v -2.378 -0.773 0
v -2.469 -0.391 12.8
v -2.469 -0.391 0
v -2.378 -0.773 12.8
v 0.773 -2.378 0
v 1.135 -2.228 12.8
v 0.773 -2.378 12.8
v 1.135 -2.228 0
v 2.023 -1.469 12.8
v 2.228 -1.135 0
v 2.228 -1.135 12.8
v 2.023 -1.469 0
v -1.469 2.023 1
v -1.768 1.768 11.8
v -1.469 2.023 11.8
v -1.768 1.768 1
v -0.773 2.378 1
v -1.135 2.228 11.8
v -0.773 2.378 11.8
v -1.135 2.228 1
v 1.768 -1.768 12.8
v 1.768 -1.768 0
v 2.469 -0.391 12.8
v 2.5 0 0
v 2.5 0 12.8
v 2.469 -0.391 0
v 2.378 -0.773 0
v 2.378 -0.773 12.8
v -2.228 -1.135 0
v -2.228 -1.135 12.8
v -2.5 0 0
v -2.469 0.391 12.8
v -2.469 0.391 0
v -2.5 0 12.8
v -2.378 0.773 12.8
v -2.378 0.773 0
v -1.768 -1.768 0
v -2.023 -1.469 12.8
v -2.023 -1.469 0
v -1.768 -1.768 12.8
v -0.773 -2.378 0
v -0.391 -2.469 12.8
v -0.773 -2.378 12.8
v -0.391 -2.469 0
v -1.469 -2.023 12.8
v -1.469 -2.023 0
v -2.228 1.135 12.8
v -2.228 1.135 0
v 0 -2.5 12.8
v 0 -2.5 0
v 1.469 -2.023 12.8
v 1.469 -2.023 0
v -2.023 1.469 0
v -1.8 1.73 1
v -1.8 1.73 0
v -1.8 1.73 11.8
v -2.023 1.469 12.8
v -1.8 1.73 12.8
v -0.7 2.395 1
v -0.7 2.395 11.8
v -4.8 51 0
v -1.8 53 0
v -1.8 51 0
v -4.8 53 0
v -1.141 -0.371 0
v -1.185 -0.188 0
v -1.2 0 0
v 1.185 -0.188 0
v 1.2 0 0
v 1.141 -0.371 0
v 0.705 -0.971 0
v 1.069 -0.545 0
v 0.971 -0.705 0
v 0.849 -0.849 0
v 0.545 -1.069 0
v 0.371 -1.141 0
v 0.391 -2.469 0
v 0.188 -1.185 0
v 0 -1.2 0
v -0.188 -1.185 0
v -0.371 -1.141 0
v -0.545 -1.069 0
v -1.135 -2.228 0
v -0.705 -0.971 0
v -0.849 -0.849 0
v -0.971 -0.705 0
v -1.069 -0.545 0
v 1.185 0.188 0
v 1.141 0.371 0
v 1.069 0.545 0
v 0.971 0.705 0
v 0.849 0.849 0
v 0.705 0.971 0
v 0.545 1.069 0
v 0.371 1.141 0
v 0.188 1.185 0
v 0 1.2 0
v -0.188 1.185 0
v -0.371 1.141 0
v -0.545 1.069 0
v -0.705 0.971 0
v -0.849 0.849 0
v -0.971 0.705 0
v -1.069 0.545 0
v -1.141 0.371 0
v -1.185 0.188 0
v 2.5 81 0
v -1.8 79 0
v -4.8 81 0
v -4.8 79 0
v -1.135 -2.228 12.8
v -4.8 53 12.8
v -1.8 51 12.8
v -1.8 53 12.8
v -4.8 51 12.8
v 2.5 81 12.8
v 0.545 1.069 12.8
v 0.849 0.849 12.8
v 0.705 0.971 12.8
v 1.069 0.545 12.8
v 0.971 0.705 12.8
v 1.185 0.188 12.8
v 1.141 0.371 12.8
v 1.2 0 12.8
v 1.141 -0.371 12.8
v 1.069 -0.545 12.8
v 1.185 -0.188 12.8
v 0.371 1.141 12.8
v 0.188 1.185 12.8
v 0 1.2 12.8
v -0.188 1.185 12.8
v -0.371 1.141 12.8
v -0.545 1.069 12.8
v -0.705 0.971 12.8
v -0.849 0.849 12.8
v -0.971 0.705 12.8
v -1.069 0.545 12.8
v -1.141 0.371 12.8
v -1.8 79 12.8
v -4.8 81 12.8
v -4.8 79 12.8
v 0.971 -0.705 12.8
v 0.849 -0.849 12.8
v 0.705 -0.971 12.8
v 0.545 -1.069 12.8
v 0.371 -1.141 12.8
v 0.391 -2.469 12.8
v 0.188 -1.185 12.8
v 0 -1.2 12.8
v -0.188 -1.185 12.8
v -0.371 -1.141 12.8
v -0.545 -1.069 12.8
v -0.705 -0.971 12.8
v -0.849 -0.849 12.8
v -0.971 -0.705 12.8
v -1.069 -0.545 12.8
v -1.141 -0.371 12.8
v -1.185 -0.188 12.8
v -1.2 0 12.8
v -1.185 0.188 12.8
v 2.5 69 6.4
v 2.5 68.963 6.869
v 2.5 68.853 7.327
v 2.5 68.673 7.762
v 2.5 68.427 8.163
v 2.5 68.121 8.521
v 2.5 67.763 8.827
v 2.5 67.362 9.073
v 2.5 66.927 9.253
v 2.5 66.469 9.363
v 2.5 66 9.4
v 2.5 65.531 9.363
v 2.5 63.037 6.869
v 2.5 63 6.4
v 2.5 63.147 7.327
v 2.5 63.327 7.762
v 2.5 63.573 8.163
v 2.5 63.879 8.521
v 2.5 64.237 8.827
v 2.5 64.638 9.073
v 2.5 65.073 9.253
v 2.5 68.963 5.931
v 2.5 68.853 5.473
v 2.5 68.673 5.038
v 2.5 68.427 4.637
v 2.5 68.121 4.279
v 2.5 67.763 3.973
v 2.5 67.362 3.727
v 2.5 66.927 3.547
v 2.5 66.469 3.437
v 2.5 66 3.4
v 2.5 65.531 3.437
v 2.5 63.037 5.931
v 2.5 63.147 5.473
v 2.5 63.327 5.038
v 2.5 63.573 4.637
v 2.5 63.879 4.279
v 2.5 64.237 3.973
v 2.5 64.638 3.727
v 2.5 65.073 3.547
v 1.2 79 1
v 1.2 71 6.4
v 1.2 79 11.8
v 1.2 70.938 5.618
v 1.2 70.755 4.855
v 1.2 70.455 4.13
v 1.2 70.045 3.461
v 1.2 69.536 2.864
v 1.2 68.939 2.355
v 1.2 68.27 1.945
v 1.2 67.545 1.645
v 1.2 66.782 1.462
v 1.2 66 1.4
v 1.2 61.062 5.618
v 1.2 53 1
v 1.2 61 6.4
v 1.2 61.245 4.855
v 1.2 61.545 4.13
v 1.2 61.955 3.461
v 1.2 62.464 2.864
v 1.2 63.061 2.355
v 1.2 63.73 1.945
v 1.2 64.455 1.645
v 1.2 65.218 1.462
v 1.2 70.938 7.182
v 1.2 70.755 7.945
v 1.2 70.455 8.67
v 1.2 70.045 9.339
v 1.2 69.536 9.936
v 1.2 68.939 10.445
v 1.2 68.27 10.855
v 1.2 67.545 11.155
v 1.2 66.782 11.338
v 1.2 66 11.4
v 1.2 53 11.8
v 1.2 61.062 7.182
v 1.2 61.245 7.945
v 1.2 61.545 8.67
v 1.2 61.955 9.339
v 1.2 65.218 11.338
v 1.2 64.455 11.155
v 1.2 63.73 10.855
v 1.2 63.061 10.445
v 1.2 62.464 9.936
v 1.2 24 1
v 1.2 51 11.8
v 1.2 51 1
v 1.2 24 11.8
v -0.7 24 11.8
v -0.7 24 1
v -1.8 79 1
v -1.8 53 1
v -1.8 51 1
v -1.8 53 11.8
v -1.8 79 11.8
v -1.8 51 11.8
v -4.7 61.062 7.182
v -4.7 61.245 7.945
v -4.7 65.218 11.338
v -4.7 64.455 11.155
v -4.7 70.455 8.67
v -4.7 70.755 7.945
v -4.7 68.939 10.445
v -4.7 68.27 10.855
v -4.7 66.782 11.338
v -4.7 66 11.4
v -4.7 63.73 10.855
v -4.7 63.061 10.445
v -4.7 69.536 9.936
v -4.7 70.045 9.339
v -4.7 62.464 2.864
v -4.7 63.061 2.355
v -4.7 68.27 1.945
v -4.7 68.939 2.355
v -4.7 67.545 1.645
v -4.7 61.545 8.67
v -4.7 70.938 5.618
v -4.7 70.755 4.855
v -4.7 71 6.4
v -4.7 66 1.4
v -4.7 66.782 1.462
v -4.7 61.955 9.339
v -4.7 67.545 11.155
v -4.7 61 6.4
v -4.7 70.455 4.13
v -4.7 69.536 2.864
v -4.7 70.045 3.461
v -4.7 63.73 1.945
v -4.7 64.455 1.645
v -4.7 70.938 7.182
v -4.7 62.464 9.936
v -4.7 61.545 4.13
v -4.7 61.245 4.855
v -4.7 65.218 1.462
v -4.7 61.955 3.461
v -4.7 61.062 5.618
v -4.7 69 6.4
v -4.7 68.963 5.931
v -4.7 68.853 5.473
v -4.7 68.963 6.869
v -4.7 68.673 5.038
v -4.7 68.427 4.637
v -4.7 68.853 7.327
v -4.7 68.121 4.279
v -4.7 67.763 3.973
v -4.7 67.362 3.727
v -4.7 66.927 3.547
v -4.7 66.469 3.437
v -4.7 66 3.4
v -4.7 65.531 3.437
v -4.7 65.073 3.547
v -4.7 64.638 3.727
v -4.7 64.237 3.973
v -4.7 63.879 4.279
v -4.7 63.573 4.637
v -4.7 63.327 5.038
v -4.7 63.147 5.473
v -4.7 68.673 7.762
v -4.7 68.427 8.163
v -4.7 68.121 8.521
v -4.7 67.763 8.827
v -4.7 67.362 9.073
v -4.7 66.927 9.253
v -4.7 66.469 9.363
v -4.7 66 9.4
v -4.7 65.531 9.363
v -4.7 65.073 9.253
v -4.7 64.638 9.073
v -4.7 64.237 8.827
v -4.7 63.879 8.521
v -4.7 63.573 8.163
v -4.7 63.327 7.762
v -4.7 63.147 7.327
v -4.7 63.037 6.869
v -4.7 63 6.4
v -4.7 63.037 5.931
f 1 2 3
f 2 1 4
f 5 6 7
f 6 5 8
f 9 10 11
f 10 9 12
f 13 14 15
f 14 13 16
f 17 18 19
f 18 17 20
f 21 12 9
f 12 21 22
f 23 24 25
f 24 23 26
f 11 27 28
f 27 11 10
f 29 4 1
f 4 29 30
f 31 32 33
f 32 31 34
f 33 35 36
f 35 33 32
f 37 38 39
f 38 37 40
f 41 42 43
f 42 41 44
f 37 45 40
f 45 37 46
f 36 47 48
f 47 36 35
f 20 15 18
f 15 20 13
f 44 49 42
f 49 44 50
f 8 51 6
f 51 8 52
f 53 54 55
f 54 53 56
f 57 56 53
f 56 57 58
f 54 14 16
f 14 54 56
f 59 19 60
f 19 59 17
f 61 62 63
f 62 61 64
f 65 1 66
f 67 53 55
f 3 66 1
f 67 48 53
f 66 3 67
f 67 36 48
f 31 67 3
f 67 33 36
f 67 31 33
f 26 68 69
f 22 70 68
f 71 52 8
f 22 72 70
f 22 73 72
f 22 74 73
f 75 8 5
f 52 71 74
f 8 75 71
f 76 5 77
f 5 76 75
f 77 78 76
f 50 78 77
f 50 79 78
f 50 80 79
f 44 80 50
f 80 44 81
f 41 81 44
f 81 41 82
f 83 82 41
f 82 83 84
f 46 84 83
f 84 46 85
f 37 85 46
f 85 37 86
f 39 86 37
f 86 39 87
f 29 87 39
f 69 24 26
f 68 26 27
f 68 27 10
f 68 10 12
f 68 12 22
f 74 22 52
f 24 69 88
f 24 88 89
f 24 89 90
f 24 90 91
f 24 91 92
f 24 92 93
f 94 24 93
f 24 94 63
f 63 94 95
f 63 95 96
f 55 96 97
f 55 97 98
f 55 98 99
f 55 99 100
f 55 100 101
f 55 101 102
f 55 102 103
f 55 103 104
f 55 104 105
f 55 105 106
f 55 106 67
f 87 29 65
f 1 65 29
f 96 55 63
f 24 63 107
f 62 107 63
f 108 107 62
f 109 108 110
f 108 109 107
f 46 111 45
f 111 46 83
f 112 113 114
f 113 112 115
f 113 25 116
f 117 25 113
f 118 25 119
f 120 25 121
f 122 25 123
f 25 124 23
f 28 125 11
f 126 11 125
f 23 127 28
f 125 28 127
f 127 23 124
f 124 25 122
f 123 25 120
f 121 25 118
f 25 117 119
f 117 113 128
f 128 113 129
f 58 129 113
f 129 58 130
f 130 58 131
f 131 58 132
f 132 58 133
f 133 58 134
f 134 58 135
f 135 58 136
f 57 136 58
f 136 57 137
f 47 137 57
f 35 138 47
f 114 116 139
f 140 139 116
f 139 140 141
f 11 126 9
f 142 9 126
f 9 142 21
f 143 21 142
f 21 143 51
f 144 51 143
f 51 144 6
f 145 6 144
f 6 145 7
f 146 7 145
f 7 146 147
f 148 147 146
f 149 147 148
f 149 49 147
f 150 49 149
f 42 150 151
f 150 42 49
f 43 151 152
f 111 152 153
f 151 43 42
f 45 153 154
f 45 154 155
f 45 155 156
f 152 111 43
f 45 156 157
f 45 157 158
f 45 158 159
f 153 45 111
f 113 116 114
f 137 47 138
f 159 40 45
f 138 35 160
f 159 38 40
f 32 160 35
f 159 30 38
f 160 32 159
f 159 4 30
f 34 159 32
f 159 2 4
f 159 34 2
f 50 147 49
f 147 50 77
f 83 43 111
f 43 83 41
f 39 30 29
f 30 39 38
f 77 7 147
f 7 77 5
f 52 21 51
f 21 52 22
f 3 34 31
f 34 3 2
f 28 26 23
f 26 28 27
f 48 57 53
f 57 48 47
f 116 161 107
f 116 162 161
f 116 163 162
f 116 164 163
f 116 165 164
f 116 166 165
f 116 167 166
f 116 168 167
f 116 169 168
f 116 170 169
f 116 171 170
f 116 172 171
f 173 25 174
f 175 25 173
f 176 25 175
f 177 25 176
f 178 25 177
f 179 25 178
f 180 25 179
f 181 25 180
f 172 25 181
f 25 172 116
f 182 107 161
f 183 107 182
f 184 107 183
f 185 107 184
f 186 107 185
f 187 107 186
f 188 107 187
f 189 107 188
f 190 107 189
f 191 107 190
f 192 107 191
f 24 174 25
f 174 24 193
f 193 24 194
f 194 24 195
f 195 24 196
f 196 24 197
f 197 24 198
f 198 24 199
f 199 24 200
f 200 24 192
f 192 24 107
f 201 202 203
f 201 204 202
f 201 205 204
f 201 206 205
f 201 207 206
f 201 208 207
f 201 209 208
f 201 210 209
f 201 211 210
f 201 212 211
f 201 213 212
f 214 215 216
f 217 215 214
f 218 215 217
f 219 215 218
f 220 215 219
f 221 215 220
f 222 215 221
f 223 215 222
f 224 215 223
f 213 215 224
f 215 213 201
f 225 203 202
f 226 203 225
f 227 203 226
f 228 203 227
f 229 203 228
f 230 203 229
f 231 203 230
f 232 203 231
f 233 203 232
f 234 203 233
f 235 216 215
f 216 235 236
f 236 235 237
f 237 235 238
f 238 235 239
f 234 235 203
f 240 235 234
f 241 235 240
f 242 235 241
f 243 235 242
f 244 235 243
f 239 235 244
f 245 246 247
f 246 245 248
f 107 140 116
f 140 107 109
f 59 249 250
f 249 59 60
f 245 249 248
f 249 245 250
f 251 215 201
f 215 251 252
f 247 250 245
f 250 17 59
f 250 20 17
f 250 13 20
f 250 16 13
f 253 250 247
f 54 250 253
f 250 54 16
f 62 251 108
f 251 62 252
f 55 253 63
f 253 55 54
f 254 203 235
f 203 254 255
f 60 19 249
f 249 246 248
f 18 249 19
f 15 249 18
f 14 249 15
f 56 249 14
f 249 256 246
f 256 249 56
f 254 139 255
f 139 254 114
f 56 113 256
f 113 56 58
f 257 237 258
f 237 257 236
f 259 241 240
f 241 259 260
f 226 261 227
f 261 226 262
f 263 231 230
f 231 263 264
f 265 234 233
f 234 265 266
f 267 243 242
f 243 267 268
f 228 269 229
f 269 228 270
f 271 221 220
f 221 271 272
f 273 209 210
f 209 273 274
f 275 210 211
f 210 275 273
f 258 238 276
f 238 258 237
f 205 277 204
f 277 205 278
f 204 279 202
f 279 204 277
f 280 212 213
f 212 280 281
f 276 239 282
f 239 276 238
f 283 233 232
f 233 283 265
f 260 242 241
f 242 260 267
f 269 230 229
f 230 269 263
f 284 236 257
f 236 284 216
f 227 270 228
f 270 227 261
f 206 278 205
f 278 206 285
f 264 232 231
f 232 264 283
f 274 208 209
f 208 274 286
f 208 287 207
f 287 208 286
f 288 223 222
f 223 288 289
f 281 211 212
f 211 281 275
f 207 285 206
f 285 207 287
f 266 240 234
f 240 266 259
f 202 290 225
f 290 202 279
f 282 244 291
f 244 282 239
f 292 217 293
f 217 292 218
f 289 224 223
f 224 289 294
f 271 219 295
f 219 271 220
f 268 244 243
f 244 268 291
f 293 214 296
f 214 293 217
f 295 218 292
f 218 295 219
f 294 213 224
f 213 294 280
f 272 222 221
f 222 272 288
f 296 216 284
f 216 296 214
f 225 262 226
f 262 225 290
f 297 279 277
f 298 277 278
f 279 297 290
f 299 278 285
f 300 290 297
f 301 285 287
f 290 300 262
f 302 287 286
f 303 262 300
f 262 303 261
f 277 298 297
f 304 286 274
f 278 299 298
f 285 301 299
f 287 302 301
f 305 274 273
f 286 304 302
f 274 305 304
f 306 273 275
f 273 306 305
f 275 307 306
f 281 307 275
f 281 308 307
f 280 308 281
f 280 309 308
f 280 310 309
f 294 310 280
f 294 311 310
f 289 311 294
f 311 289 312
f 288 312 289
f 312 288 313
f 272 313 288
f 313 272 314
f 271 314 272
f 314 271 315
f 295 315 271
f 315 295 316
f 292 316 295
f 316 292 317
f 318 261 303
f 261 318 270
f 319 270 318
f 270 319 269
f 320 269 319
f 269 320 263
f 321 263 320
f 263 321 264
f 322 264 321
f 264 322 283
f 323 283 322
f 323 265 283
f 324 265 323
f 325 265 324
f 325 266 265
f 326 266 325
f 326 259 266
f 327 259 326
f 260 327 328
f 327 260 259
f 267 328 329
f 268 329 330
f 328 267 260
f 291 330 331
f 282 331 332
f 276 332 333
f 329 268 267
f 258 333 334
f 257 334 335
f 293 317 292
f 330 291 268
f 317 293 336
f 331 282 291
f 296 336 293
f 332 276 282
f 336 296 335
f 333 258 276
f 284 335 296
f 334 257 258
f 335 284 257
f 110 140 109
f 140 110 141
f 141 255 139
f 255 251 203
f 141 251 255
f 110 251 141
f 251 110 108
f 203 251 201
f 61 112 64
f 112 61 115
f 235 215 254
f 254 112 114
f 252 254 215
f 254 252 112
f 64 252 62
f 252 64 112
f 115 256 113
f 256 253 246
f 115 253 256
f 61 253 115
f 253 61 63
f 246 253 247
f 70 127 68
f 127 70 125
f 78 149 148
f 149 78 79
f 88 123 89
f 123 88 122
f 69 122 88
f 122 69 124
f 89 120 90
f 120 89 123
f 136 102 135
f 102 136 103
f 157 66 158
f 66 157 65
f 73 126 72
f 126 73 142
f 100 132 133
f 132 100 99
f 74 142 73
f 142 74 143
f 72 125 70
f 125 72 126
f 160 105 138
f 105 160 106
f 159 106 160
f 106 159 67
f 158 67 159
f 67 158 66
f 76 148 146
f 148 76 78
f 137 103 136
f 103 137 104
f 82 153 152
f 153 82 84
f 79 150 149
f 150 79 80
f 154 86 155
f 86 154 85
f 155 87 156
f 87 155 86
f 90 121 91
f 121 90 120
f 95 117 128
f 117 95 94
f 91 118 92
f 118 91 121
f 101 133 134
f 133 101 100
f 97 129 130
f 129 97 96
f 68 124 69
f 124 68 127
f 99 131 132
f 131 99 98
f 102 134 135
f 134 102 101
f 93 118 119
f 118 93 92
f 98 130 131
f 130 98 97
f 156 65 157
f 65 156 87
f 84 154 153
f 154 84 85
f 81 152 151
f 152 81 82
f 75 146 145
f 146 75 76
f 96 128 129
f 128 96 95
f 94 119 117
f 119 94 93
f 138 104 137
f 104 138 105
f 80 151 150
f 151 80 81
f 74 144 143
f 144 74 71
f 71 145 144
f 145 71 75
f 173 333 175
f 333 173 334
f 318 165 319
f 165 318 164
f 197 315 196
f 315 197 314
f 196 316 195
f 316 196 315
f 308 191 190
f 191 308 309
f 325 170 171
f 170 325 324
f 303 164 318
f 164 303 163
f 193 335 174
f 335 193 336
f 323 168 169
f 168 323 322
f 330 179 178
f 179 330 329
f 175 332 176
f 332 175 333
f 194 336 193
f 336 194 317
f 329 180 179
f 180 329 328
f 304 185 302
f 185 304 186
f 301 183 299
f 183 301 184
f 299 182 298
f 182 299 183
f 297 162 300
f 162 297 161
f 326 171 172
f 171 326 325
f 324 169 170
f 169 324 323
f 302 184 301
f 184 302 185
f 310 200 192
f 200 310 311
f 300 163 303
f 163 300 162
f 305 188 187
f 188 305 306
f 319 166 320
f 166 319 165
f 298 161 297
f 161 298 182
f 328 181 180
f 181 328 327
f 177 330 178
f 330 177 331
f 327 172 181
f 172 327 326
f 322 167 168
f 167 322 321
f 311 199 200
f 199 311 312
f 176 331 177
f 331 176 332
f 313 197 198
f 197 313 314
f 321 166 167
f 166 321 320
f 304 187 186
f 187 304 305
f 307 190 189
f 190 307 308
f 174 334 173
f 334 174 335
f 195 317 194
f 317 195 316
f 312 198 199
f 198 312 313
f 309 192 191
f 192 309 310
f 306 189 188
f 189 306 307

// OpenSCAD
$fn = 40;

//translate([-16.5,0,-2]) cube([42,22,1]);


//  Length from pivot to target edge
//  Old hinge 30, new hinge 26 (double check)
base_length = 24;
target_radius = 41;
gap = 1;


draw_arm(target_radius, base_length, 1);

//  Arm length is 55mm + target diameter
//  Large: 82, Medium: 60, Small: 35
        
module draw_arm(target_radius, base_length, gap)
{   
    target_holder = 15;
    length = target_radius + base_length + gap + target_holder;
    
//  Axle hole
    difference()
    {
        union()
        {            
            //  Render the cylinder which holds the axle
            cylinder(h=12.8, r1=2.5, r2=2.5);
            
            //  Render the full length of the arm
            translate([1.2,0,0]) cube([1.3,length,12.8]);
            
            //  Magnet holder
            color("green") translate([-0.7,0,0]) cube([3,24,12.8]);
            
            //  Render the two support sections
            translate([-1.8,0,0]) cube([3,length,1]);
            translate([-1.8,0,11.8]) cube([3,length,1]);
            
            //  LED holder
            translate([2.5,length - 15,6.4]) rotate([0,-90,0]) cylinder(h=7.2, r=5);
            
            //  target holders
            translate([-4.8,length - 2 ,0]) cube([7,2,12.8]);
            translate([-4.8,length - 2 * target_holder,0]) cube([7,2,12.8]);
        }
                
        //  Remove the hole for the axle
        translate([0,0,-0.1]) cylinder(h=13, r1=1.2, r2=1.2);
        
        translate([4.1,length - 15,6.4]) rotate([0,-90,0]) translate([0,0,0.5]) cylinder(h=8.4, r=3);
    }
}

//  Backstop
module backstop()
{
    translate([12,2,1]) cube([2,16,9]);
    
    color("orange") 
            rotate([90,0,90]) translate([11,10,12])  
                cylinder(h=2, r1=8, r2=8);    
    
    //  rear chamfer
    difference()
    {
        translate([12,10,0]) cube([8,2,11.4]);
        color("purple") 
            translate([20,9,1]) rotate([0,-30,0]) 
                cube([6,5,12]);                       
    }
}

//  Methods
module side(servo_mount)
{
    if(servo_mount){
            color("blue") 
                translate([2,5.3,0]) cube([8,1,10]);
        
            color("green") 
                translate([10,3.3,0]) cube([1,3,10]);
    }

    //  Top edge
    difference()
    {
        translate([0,2,0]) cube([14,2,10]);
        
        if(servo_mount)
        {
            color("blue") 
                translate([0,1.9,0]) cube([5,3,15]);
        }
        else
        {
            //  Front chamfer
            color("blue") 
                translate([-5,1.9,2.3]) rotate([0,30,0]) 
                    cube([5,3,15]);
        }
        //  Axle hole
        color("green") 
            rotate([90,0,0]) translate([7,6,-4.1])  
                cylinder(h=5, r1=1.1, r2=1.1);
    }    
    
    //  Bottom edge
    if(servo_mount)
    {
        difference()
        {
            translate([12,2,0]) cube([14,2,10]);
            
            //  Screw hole
            color("green") 
                rotate([90,0,0]) translate([20,7.5,-5.1])  
                    cylinder(h=5, r=0.75);
        }
    }
    else
    {
        //  rear chamfer
        difference()
        {
            translate([12,2,0]) cube([8,2,10]);
                color("purple") 
                    translate([20,1.9,1]) rotate([0,-30,0]) 
                        cube([6,5,12]);        
        }
    }
}

module draw_hinge(){
    difference(){
        union()
        {
            backstop();
            side();
            translate([-2,0,0]) cube([28,22,1]);
            translate([0,16,0]) side(true);
            translate([-5,11,0]) cylinder(h=2, r1=11.5, r2=11.5);  
        }
        translate([-5,11,0.7]) cylinder(h=26, r1=10.5, r2=10.5);  
    }
}

module led_holder()
{
    difference()
    {
        
    }
}
